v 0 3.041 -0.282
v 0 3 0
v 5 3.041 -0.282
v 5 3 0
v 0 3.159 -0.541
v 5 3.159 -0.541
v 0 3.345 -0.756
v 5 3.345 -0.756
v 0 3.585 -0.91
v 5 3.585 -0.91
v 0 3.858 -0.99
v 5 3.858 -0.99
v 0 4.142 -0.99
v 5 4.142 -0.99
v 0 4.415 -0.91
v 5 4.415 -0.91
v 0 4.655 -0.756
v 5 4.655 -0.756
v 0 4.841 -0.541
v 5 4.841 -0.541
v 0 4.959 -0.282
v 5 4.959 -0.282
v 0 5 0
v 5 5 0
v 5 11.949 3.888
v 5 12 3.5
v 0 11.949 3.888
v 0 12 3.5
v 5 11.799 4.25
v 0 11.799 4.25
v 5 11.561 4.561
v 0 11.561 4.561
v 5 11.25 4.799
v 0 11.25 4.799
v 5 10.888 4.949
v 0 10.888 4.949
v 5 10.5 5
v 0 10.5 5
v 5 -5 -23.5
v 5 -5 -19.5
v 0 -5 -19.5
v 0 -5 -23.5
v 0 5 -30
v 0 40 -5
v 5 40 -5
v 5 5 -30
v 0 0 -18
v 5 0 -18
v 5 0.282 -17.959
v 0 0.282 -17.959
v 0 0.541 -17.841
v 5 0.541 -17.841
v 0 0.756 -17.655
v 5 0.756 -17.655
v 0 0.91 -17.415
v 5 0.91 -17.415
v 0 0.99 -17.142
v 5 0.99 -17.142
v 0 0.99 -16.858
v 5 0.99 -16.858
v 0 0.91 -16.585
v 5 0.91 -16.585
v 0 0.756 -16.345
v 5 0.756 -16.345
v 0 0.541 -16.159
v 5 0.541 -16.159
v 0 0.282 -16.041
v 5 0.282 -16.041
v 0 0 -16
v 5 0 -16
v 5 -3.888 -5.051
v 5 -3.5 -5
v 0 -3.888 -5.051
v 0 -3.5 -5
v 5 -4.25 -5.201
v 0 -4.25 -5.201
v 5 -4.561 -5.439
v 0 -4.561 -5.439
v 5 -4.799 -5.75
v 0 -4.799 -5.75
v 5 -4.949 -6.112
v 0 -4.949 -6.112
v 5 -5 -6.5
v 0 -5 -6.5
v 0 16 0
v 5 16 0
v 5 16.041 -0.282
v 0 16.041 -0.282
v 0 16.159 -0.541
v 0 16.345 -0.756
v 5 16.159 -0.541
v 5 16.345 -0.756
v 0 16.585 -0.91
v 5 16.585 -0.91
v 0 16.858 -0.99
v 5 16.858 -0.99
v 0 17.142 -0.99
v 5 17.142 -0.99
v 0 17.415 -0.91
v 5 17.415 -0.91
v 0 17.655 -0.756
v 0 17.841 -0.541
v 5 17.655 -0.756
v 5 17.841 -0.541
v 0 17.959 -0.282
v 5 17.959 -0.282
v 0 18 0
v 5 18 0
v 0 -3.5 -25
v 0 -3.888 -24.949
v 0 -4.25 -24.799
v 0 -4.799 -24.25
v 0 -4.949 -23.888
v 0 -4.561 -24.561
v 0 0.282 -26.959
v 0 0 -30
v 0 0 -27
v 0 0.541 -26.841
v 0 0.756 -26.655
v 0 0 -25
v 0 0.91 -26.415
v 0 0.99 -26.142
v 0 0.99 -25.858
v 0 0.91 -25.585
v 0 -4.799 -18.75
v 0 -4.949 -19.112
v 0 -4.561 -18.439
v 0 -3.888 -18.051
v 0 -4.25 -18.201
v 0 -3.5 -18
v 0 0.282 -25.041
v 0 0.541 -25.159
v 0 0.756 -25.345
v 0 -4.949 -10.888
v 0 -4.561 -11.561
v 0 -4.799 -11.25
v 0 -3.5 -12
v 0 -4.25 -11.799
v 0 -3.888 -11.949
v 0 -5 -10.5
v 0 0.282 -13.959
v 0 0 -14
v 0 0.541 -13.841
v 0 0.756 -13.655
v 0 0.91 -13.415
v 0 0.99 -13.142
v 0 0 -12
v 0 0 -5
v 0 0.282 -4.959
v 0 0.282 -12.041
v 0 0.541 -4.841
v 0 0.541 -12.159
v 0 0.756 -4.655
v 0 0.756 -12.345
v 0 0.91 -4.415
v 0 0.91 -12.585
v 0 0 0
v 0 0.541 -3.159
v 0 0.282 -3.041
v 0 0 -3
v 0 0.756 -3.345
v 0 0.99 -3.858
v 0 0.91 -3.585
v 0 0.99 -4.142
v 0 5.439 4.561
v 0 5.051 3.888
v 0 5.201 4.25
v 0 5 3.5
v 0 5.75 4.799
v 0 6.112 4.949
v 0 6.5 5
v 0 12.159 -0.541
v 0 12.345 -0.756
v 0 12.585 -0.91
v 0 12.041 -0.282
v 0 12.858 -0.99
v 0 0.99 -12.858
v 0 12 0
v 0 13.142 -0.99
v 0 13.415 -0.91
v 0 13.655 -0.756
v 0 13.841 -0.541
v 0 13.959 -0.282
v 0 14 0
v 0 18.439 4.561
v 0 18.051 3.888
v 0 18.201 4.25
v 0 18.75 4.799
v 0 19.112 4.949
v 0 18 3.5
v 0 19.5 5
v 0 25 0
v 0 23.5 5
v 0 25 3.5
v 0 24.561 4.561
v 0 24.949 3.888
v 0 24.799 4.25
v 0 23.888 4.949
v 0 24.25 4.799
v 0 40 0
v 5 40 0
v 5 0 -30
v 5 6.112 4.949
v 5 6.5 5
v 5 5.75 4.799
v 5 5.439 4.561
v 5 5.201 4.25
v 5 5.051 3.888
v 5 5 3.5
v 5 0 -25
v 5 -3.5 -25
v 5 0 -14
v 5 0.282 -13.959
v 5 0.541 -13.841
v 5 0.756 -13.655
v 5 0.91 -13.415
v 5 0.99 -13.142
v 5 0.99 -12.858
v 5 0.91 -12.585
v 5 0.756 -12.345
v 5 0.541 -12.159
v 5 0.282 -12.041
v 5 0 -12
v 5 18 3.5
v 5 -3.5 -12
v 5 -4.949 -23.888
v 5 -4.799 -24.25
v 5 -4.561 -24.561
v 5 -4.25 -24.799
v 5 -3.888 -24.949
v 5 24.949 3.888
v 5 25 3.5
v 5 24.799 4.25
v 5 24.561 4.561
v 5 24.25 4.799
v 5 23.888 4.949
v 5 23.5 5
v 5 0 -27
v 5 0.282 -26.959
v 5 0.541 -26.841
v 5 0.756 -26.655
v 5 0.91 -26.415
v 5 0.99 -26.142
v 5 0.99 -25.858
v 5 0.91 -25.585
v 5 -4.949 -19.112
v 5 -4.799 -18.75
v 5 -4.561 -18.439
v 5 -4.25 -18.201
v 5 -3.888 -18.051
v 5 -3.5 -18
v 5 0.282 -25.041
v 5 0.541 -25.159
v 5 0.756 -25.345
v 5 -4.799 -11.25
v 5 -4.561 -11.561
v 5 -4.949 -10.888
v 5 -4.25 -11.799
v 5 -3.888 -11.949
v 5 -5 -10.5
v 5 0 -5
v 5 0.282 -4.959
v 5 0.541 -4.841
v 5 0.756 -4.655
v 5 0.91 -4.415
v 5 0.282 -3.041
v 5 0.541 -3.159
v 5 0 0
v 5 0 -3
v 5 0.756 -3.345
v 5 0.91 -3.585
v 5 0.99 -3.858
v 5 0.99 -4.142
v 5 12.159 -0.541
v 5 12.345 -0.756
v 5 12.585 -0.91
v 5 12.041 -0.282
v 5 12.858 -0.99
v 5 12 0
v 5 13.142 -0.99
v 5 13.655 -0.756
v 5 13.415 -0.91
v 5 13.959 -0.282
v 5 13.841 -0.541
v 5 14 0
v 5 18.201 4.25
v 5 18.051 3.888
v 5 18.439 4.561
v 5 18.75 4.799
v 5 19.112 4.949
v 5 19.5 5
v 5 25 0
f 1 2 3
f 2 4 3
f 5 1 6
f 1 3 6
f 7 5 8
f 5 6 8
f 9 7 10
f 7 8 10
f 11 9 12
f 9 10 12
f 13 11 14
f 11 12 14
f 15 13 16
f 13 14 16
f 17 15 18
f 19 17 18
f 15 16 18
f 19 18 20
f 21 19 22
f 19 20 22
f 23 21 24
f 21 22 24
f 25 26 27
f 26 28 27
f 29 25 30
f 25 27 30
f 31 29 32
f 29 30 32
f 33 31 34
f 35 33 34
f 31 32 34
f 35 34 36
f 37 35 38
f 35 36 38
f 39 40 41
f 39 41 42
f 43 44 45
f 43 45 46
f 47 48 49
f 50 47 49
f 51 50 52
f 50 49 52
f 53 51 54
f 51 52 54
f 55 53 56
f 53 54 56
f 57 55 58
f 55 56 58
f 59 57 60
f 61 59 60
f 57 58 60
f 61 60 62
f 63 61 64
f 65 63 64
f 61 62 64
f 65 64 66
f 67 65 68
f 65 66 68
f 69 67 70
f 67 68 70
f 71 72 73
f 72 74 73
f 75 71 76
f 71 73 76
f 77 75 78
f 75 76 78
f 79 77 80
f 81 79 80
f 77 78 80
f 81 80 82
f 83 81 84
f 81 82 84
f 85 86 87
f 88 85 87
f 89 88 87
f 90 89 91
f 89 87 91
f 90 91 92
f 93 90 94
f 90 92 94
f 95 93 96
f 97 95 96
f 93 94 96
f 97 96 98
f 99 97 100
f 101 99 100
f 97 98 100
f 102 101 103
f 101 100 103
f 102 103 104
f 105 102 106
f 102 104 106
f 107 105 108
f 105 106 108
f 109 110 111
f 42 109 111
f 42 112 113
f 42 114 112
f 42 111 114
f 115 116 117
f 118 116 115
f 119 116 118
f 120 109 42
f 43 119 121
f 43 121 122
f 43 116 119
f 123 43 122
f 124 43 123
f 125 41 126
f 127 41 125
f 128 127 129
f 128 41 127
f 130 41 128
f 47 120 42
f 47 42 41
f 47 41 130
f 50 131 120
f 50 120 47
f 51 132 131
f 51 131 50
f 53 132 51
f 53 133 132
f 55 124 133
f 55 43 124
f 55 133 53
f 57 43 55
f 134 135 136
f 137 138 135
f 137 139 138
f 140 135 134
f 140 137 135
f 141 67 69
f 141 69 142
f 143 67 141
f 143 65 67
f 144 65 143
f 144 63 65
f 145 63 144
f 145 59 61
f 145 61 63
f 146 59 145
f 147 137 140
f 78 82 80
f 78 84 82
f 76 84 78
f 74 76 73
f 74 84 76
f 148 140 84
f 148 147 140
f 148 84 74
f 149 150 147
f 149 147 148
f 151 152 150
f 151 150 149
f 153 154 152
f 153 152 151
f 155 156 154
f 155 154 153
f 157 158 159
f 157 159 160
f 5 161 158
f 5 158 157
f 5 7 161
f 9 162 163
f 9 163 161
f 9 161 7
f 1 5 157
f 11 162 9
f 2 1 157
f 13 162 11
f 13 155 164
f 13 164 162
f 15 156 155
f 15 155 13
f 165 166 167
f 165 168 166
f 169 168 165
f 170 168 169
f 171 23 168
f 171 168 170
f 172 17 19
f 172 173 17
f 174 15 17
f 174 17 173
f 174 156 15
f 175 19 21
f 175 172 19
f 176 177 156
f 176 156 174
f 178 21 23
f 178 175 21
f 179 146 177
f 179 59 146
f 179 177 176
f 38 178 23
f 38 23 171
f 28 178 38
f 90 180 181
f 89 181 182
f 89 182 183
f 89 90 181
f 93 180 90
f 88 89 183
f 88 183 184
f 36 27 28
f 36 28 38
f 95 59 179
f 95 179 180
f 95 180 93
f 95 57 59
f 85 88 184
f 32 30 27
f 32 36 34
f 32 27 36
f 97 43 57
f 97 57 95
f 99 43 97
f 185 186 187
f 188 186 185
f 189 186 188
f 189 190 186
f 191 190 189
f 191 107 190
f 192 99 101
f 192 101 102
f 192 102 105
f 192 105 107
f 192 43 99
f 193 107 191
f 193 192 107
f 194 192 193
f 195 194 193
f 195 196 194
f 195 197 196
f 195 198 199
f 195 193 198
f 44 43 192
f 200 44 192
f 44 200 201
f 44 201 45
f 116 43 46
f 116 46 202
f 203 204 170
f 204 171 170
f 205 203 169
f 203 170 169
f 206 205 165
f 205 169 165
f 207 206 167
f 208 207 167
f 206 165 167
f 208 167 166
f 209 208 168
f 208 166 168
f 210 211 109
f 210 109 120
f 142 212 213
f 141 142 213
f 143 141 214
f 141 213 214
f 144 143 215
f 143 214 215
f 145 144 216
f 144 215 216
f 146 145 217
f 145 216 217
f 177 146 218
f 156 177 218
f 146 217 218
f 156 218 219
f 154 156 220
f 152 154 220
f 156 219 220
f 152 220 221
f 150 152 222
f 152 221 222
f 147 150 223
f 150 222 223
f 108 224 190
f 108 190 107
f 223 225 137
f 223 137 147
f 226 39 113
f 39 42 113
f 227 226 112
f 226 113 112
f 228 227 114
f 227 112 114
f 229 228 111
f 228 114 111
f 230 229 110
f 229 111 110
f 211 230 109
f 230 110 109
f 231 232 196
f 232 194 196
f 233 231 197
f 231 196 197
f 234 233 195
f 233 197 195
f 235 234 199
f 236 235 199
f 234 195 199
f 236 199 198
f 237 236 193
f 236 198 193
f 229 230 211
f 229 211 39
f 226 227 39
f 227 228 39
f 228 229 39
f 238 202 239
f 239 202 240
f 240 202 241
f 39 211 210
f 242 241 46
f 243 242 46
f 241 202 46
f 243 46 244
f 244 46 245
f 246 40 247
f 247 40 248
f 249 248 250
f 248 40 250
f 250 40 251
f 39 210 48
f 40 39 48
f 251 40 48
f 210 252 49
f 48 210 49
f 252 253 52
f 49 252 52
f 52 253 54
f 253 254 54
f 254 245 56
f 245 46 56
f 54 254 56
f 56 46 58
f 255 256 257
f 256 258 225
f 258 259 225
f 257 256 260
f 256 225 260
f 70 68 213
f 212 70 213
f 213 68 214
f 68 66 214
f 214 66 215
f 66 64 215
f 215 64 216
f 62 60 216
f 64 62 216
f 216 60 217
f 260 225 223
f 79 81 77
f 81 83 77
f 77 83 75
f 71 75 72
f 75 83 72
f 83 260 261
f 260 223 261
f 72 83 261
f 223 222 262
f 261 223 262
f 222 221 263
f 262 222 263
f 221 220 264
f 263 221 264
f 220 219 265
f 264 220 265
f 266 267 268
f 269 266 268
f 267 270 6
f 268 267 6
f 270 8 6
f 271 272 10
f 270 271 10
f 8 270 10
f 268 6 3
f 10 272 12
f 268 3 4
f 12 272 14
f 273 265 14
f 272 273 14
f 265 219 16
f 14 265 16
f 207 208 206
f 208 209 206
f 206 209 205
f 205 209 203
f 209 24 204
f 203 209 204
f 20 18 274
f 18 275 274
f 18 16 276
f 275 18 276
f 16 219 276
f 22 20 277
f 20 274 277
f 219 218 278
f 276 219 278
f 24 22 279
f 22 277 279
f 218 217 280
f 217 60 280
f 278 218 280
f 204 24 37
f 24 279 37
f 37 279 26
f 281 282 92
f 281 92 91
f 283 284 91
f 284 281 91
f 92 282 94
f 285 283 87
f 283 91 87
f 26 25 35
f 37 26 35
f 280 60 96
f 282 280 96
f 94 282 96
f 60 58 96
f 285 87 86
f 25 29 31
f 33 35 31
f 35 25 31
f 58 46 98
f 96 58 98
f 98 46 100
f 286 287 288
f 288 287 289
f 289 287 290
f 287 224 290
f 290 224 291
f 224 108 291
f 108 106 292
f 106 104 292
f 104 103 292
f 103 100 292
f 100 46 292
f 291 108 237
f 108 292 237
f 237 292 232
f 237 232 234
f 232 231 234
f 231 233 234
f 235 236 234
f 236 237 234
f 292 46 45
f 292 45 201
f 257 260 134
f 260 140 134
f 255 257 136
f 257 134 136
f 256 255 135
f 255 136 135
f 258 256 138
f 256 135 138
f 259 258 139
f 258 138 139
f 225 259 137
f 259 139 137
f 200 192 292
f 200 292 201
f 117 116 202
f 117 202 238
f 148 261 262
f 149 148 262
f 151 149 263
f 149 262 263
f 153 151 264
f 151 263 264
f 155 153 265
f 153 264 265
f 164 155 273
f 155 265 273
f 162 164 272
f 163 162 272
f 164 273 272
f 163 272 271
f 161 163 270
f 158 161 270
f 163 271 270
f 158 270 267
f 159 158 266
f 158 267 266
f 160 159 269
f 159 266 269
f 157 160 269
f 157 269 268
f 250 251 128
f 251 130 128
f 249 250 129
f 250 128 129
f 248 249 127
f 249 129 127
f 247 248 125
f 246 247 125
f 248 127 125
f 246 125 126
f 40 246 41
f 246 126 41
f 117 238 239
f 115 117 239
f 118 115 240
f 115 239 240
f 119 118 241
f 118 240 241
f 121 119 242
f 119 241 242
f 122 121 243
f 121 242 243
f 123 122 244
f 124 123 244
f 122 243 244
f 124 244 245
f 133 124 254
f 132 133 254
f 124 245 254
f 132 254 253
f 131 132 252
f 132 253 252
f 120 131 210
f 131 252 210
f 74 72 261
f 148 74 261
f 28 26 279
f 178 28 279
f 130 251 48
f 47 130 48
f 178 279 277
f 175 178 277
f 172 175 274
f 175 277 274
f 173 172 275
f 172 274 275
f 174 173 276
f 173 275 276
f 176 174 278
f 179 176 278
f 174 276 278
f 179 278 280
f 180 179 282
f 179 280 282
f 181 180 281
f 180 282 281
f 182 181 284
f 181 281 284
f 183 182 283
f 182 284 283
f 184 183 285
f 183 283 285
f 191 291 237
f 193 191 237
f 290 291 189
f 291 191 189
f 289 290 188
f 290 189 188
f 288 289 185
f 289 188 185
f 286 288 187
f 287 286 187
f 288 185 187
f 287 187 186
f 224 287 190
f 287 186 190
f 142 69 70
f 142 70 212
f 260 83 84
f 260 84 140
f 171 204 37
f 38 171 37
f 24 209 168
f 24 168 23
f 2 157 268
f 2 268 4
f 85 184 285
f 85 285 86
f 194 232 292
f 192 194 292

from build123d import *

# Parameters (mm, degrees)
EXTRUDE_1_DEPTH     = 5
SKETCH_2_W          = 7
SKETCH_2_H          = 5
SKETCH_2_W_2        = 5
SKETCH_2_H_2        = 7
EXTRUDE_2_DEPTH     = 5
SKETCH_3_R          = 1
CUT_EXTRUDE_1_DEPTH = 5
FILLET_1_R          = 1.5


with BuildPart() as part:
    # 스케치1 → 보스-돌출1 (new body)
    with BuildSketch(Plane(origin=(0, 0, 0), x_dir=(0, 0, -1), z_dir=(1, 0, 0))):
        Polygon((0, 0), (0, 40), (5, 40), (30, 5), (30, 0), align=None)
    extrude(amount=EXTRUDE_1_DEPTH)

    # 스케치2 → 보스-돌출2 (add)
    with BuildSketch(Plane(origin=(5, 0, 0), x_dir=(0, 0, -1), z_dir=(1, 0, 0))):
        with Locations((8.5, -2.5)):
            Rectangle(SKETCH_2_W, SKETCH_2_H)
        with Locations((21.5, -2.5)):
            Rectangle(SKETCH_2_W, SKETCH_2_H)
        with Locations((-2.5, 21.5)):
            Rectangle(SKETCH_2_W_2, SKETCH_2_H_2)
        with Locations((-2.5, 8.5)):
            Rectangle(SKETCH_2_W_2, SKETCH_2_H_2)
    extrude(amount=-EXTRUDE_2_DEPTH)

    # 스케치3 → 컷-돌출1 (cut)
    with BuildSketch(Plane(origin=(5, 0, 0), x_dir=(0, 0, -1), z_dir=(1, 0, 0))):
        with Locations((4, 0)):
            Circle(SKETCH_3_R)
        with Locations((13, 0)):
            Circle(SKETCH_3_R)
        with Locations((17, 0)):
            Circle(SKETCH_3_R)
        with Locations((26, 0)):
            Circle(SKETCH_3_R)
        with Locations((0, 4)):
            Circle(SKETCH_3_R)
        with Locations((0, 13)):
            Circle(SKETCH_3_R)
        with Locations((0, 17)):
            Circle(SKETCH_3_R)
    extrude(amount=-CUT_EXTRUDE_1_DEPTH, mode=Mode.SUBTRACT)

    # 필렛1
    fillet_1_edges = [part.edges().sort_by_distance(p)[0] for p in [
        (2.5, -5, -25),
        (2.5, -5, -12),
        (2.5, -5, -18),
        (2.5, 25, 5),
        (2.5, 18, 5),
        (2.5, -5, -5),
        (2.5, 5, 5),
        (2.5, 12, 5),
    ]]
    fillet(fillet_1_edges, radius=FILLET_1_R)


solid = part.part
